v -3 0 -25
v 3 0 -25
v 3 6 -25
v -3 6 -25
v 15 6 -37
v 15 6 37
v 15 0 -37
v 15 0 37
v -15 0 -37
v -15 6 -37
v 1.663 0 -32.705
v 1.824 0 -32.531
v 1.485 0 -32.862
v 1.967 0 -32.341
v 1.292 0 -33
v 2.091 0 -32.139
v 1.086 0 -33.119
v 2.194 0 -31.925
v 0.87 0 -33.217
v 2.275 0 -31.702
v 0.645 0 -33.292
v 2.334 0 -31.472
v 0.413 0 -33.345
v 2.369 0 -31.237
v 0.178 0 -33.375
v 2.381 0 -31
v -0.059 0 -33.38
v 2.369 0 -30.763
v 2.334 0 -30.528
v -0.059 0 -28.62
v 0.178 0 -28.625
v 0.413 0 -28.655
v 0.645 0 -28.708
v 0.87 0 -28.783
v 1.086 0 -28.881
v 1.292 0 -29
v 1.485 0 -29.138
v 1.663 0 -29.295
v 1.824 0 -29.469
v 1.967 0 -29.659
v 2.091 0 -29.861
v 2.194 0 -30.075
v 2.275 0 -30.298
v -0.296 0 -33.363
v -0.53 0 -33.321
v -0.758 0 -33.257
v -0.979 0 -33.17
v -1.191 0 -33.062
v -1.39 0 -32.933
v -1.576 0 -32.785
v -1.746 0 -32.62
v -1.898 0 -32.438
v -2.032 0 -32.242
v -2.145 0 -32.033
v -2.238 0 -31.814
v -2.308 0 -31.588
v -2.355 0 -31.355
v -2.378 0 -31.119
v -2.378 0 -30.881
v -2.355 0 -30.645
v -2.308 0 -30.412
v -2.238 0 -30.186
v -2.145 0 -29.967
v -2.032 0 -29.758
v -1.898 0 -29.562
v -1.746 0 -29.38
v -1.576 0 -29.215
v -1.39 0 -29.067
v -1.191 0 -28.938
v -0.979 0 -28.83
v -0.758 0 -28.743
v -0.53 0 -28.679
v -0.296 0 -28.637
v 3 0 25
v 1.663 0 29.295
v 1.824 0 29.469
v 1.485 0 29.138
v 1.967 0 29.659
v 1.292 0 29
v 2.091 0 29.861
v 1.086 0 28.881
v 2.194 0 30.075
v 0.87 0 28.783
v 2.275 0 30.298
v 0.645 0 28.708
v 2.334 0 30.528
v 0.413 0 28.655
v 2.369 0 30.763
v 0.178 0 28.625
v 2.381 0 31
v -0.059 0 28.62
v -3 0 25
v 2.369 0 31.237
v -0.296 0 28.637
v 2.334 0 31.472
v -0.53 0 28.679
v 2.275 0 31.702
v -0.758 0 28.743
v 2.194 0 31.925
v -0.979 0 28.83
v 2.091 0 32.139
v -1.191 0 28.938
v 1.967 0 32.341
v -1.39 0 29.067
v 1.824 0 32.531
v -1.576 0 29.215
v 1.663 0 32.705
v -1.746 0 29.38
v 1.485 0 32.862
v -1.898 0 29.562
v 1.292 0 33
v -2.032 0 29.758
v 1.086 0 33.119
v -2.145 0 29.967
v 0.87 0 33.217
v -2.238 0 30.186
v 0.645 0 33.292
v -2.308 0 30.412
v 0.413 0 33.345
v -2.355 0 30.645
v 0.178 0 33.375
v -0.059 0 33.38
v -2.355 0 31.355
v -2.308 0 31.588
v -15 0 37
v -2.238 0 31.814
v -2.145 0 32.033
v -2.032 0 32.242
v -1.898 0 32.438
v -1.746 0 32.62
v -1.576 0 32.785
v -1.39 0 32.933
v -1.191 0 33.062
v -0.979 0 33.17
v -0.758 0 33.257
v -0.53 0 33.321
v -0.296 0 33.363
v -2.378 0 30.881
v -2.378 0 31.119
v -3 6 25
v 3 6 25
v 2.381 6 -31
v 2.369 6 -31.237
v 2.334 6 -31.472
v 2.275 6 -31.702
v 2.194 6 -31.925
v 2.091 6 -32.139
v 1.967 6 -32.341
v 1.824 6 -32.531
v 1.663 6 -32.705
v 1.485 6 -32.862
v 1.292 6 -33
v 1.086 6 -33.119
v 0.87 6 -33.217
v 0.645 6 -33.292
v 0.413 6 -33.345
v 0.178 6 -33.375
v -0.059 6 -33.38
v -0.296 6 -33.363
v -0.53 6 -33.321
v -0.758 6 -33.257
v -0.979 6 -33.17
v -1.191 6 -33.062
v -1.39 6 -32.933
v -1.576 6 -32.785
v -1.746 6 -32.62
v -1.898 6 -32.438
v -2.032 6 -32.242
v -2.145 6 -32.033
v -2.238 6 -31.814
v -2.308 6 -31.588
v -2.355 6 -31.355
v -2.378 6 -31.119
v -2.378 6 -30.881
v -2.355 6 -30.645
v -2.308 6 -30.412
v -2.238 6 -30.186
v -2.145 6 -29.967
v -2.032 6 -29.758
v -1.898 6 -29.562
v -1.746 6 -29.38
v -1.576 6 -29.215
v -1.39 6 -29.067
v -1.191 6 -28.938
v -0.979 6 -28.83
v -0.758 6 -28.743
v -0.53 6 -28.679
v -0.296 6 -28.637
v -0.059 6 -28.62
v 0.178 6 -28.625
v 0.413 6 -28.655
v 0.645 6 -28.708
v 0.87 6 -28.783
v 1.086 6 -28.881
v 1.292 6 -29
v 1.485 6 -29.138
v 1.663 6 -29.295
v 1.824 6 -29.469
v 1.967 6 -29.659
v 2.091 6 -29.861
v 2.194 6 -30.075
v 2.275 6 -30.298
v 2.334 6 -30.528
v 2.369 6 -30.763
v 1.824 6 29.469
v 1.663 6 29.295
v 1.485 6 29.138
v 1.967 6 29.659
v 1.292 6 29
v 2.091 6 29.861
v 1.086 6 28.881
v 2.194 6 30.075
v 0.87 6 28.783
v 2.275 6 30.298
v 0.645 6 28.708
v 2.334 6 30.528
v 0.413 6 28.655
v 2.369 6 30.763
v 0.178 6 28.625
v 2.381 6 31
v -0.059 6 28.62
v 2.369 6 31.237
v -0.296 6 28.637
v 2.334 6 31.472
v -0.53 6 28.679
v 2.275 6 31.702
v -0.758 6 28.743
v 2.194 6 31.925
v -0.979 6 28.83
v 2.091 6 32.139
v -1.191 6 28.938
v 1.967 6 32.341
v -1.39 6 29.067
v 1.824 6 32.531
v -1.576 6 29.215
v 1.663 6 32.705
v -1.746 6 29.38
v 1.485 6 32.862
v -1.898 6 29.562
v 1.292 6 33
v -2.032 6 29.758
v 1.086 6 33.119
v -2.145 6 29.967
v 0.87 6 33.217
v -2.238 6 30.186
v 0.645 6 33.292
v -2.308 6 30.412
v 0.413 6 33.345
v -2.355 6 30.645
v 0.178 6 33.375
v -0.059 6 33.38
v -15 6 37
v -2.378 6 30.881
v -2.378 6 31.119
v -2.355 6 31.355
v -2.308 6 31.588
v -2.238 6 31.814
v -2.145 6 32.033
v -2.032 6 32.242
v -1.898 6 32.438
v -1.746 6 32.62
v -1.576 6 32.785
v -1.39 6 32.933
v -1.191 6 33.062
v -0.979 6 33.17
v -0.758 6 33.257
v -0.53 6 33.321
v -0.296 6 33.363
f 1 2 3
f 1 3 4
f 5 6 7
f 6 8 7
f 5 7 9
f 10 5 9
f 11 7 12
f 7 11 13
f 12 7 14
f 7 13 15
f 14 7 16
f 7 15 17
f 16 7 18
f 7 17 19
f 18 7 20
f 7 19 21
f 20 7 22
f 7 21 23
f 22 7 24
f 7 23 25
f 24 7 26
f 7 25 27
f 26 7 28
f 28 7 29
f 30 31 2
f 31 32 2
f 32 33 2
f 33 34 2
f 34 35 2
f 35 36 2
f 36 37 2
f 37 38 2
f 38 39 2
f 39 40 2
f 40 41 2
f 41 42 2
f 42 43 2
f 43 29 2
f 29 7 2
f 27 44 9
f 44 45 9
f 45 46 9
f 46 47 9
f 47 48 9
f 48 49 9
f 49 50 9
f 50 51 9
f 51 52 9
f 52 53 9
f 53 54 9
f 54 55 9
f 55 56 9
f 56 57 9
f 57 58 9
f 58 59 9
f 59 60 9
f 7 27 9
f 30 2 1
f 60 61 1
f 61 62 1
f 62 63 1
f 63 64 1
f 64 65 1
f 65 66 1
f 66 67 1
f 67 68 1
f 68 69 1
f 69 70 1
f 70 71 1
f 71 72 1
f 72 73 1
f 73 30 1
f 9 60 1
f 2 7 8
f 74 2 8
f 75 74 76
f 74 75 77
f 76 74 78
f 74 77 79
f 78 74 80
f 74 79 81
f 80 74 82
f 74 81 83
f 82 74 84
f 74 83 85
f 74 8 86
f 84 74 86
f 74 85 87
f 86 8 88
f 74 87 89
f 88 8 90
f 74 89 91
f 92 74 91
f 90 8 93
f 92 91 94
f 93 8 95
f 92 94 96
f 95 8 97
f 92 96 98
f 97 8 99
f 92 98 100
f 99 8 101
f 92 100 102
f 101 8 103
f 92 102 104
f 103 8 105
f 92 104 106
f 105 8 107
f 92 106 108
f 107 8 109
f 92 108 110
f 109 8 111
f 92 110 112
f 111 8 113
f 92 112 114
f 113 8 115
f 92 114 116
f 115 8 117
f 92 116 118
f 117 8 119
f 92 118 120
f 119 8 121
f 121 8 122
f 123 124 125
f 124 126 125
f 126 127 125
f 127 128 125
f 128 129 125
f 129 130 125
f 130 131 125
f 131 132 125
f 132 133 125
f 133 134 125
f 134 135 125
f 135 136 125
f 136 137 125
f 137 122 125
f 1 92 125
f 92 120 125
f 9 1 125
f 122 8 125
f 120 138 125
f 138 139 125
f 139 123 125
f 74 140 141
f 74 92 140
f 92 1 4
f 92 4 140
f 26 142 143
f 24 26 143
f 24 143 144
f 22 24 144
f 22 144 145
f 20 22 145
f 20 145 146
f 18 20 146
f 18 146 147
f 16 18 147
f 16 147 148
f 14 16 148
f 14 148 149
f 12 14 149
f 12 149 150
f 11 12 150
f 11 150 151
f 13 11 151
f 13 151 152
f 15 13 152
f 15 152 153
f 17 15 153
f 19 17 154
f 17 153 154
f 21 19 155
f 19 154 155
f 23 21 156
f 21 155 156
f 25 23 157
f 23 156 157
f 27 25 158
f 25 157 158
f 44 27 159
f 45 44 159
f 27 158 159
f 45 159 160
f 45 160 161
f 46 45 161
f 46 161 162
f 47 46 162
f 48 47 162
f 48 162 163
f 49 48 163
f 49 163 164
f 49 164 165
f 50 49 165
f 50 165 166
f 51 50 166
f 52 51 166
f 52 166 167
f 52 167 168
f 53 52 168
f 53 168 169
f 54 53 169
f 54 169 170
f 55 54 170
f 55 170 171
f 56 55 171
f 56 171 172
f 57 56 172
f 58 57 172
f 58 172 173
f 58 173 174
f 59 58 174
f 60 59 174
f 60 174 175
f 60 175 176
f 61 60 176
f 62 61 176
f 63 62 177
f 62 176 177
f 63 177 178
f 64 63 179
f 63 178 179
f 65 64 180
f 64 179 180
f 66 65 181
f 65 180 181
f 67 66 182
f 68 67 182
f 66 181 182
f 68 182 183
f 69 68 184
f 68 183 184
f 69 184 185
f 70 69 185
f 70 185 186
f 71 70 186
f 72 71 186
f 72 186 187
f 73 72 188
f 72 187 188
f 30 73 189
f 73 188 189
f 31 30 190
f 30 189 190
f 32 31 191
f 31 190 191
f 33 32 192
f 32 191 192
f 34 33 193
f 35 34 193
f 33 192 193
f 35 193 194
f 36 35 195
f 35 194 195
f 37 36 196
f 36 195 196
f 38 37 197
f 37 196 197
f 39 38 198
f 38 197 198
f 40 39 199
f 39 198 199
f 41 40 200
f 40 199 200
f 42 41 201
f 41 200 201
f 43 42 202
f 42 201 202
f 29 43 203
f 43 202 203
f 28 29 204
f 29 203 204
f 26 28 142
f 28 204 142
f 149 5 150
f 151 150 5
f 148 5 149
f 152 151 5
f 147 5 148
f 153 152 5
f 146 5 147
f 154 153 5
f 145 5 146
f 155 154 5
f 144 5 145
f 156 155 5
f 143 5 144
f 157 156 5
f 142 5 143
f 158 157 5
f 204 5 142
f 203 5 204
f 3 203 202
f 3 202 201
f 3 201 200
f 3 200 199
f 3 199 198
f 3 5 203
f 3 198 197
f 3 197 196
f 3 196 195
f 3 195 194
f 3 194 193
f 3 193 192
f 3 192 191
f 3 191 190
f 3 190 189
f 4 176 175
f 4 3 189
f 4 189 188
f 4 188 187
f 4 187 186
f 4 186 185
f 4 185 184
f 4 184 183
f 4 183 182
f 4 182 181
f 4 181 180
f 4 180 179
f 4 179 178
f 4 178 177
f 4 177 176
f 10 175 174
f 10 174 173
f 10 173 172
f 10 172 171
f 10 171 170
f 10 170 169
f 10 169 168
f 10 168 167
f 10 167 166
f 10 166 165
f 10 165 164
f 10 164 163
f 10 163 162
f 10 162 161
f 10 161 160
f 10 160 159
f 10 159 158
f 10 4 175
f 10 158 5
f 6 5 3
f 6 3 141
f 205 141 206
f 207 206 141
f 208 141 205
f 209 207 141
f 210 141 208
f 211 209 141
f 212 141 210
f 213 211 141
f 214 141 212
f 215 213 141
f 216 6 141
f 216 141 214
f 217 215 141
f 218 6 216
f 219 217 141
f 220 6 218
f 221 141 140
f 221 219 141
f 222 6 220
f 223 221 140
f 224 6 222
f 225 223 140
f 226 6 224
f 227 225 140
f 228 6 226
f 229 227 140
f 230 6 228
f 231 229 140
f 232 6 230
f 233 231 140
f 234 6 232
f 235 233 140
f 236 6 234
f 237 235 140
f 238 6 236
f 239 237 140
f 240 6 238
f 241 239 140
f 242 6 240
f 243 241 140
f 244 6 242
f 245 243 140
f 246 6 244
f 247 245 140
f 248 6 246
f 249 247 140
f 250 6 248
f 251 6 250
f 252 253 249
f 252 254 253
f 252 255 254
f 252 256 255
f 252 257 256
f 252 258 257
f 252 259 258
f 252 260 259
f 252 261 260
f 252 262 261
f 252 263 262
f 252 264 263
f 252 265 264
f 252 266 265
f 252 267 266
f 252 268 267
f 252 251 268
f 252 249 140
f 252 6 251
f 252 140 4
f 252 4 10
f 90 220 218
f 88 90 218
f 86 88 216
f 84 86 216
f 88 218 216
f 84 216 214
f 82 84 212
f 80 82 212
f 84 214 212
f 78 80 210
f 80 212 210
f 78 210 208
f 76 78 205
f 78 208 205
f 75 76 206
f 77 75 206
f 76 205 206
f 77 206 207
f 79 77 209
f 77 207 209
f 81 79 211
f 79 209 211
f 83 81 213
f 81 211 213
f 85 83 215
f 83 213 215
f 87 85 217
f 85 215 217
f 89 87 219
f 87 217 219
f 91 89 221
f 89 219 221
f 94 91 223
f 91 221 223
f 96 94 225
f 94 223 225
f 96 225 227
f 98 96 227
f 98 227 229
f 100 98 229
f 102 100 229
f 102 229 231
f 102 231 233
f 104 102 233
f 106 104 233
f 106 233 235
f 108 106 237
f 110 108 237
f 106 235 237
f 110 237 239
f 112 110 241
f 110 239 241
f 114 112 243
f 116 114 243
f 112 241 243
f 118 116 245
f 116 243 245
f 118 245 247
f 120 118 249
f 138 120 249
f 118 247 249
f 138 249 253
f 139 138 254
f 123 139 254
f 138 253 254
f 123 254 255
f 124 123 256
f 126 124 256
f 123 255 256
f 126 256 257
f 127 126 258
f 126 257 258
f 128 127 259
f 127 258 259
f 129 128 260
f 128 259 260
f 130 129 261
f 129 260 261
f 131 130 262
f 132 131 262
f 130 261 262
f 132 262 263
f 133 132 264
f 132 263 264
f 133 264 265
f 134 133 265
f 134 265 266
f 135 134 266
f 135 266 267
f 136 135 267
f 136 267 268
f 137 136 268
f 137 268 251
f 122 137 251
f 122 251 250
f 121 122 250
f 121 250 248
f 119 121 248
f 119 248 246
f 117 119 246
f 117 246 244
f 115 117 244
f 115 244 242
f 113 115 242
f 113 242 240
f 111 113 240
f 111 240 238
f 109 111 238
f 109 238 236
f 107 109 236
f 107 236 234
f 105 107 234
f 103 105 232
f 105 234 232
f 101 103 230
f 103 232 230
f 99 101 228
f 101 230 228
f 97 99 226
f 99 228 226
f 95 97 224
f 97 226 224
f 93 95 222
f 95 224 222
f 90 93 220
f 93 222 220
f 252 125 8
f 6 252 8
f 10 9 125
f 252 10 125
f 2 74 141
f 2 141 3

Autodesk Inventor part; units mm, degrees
ref_plane "YZ Plane" through (0, 0, 0) normal (1, 0, 0) x (0, 1, 0)
ref_plane "XZ Plane" through (0, 0, 0) normal (0, 1, 0) x (-1, 0, 0)
ref_plane "XY Plane" through (0, 0, 0) normal (0, 0, 1) x (1, 0, 0)
sketch "Boceto1" plane through (0, 0, 0) normal (0, 1, 0) x (-1, 0, 0)
  line L0 (-15, -37) -> (15, -37)
  line L1 (15, -37) -> (15, 37)
  line L2 (15, 37) -> (-15, 37)
  line L3 (-15, 37) -> (-15, -37)
  line L4 (-15, -37) -> (15, 37) construction
  line L5 (15, -37) -> (-15, 37) construction
  line L6 (-3, -25) -> (3, -25)
  line L7 (3, -25) -> (3, 25)
  line L8 (3, 25) -> (-3, 25)
  line L9 (-3, 25) -> (-3, -25)
  line L10 (-3, -25) -> (3, 25) construction
  line L11 (3, -25) -> (-3, 25) construction
  point P0 (0, 0)
  dimension "d2" = 6
  dimension "d3" = 50
  dimension "d4" = 12
  dimension "d5" = 12
extrude "Extrusión1" add sketch "Boceto1" along normal blind 6
sketch "Boceto2" plane through (0, 6, 0) normal (0, 1, 0) x (1, 0, 0)
  circle A0 centre (0, -31) radius 2.3812
  line L0 (-15, -37) -> (15, -37) projected
  point P0 (0, 0)
  dimension "d8" = 4.7625
  dimension "d9" = 6
extrude "Extrusión2" cut sketch "Boceto2" against normal through all
mirror "Simetría1" about plane through (0, 0, 0) normal (0, 0, 1) of "Extrusión2"
properties part number "sotenedor"
